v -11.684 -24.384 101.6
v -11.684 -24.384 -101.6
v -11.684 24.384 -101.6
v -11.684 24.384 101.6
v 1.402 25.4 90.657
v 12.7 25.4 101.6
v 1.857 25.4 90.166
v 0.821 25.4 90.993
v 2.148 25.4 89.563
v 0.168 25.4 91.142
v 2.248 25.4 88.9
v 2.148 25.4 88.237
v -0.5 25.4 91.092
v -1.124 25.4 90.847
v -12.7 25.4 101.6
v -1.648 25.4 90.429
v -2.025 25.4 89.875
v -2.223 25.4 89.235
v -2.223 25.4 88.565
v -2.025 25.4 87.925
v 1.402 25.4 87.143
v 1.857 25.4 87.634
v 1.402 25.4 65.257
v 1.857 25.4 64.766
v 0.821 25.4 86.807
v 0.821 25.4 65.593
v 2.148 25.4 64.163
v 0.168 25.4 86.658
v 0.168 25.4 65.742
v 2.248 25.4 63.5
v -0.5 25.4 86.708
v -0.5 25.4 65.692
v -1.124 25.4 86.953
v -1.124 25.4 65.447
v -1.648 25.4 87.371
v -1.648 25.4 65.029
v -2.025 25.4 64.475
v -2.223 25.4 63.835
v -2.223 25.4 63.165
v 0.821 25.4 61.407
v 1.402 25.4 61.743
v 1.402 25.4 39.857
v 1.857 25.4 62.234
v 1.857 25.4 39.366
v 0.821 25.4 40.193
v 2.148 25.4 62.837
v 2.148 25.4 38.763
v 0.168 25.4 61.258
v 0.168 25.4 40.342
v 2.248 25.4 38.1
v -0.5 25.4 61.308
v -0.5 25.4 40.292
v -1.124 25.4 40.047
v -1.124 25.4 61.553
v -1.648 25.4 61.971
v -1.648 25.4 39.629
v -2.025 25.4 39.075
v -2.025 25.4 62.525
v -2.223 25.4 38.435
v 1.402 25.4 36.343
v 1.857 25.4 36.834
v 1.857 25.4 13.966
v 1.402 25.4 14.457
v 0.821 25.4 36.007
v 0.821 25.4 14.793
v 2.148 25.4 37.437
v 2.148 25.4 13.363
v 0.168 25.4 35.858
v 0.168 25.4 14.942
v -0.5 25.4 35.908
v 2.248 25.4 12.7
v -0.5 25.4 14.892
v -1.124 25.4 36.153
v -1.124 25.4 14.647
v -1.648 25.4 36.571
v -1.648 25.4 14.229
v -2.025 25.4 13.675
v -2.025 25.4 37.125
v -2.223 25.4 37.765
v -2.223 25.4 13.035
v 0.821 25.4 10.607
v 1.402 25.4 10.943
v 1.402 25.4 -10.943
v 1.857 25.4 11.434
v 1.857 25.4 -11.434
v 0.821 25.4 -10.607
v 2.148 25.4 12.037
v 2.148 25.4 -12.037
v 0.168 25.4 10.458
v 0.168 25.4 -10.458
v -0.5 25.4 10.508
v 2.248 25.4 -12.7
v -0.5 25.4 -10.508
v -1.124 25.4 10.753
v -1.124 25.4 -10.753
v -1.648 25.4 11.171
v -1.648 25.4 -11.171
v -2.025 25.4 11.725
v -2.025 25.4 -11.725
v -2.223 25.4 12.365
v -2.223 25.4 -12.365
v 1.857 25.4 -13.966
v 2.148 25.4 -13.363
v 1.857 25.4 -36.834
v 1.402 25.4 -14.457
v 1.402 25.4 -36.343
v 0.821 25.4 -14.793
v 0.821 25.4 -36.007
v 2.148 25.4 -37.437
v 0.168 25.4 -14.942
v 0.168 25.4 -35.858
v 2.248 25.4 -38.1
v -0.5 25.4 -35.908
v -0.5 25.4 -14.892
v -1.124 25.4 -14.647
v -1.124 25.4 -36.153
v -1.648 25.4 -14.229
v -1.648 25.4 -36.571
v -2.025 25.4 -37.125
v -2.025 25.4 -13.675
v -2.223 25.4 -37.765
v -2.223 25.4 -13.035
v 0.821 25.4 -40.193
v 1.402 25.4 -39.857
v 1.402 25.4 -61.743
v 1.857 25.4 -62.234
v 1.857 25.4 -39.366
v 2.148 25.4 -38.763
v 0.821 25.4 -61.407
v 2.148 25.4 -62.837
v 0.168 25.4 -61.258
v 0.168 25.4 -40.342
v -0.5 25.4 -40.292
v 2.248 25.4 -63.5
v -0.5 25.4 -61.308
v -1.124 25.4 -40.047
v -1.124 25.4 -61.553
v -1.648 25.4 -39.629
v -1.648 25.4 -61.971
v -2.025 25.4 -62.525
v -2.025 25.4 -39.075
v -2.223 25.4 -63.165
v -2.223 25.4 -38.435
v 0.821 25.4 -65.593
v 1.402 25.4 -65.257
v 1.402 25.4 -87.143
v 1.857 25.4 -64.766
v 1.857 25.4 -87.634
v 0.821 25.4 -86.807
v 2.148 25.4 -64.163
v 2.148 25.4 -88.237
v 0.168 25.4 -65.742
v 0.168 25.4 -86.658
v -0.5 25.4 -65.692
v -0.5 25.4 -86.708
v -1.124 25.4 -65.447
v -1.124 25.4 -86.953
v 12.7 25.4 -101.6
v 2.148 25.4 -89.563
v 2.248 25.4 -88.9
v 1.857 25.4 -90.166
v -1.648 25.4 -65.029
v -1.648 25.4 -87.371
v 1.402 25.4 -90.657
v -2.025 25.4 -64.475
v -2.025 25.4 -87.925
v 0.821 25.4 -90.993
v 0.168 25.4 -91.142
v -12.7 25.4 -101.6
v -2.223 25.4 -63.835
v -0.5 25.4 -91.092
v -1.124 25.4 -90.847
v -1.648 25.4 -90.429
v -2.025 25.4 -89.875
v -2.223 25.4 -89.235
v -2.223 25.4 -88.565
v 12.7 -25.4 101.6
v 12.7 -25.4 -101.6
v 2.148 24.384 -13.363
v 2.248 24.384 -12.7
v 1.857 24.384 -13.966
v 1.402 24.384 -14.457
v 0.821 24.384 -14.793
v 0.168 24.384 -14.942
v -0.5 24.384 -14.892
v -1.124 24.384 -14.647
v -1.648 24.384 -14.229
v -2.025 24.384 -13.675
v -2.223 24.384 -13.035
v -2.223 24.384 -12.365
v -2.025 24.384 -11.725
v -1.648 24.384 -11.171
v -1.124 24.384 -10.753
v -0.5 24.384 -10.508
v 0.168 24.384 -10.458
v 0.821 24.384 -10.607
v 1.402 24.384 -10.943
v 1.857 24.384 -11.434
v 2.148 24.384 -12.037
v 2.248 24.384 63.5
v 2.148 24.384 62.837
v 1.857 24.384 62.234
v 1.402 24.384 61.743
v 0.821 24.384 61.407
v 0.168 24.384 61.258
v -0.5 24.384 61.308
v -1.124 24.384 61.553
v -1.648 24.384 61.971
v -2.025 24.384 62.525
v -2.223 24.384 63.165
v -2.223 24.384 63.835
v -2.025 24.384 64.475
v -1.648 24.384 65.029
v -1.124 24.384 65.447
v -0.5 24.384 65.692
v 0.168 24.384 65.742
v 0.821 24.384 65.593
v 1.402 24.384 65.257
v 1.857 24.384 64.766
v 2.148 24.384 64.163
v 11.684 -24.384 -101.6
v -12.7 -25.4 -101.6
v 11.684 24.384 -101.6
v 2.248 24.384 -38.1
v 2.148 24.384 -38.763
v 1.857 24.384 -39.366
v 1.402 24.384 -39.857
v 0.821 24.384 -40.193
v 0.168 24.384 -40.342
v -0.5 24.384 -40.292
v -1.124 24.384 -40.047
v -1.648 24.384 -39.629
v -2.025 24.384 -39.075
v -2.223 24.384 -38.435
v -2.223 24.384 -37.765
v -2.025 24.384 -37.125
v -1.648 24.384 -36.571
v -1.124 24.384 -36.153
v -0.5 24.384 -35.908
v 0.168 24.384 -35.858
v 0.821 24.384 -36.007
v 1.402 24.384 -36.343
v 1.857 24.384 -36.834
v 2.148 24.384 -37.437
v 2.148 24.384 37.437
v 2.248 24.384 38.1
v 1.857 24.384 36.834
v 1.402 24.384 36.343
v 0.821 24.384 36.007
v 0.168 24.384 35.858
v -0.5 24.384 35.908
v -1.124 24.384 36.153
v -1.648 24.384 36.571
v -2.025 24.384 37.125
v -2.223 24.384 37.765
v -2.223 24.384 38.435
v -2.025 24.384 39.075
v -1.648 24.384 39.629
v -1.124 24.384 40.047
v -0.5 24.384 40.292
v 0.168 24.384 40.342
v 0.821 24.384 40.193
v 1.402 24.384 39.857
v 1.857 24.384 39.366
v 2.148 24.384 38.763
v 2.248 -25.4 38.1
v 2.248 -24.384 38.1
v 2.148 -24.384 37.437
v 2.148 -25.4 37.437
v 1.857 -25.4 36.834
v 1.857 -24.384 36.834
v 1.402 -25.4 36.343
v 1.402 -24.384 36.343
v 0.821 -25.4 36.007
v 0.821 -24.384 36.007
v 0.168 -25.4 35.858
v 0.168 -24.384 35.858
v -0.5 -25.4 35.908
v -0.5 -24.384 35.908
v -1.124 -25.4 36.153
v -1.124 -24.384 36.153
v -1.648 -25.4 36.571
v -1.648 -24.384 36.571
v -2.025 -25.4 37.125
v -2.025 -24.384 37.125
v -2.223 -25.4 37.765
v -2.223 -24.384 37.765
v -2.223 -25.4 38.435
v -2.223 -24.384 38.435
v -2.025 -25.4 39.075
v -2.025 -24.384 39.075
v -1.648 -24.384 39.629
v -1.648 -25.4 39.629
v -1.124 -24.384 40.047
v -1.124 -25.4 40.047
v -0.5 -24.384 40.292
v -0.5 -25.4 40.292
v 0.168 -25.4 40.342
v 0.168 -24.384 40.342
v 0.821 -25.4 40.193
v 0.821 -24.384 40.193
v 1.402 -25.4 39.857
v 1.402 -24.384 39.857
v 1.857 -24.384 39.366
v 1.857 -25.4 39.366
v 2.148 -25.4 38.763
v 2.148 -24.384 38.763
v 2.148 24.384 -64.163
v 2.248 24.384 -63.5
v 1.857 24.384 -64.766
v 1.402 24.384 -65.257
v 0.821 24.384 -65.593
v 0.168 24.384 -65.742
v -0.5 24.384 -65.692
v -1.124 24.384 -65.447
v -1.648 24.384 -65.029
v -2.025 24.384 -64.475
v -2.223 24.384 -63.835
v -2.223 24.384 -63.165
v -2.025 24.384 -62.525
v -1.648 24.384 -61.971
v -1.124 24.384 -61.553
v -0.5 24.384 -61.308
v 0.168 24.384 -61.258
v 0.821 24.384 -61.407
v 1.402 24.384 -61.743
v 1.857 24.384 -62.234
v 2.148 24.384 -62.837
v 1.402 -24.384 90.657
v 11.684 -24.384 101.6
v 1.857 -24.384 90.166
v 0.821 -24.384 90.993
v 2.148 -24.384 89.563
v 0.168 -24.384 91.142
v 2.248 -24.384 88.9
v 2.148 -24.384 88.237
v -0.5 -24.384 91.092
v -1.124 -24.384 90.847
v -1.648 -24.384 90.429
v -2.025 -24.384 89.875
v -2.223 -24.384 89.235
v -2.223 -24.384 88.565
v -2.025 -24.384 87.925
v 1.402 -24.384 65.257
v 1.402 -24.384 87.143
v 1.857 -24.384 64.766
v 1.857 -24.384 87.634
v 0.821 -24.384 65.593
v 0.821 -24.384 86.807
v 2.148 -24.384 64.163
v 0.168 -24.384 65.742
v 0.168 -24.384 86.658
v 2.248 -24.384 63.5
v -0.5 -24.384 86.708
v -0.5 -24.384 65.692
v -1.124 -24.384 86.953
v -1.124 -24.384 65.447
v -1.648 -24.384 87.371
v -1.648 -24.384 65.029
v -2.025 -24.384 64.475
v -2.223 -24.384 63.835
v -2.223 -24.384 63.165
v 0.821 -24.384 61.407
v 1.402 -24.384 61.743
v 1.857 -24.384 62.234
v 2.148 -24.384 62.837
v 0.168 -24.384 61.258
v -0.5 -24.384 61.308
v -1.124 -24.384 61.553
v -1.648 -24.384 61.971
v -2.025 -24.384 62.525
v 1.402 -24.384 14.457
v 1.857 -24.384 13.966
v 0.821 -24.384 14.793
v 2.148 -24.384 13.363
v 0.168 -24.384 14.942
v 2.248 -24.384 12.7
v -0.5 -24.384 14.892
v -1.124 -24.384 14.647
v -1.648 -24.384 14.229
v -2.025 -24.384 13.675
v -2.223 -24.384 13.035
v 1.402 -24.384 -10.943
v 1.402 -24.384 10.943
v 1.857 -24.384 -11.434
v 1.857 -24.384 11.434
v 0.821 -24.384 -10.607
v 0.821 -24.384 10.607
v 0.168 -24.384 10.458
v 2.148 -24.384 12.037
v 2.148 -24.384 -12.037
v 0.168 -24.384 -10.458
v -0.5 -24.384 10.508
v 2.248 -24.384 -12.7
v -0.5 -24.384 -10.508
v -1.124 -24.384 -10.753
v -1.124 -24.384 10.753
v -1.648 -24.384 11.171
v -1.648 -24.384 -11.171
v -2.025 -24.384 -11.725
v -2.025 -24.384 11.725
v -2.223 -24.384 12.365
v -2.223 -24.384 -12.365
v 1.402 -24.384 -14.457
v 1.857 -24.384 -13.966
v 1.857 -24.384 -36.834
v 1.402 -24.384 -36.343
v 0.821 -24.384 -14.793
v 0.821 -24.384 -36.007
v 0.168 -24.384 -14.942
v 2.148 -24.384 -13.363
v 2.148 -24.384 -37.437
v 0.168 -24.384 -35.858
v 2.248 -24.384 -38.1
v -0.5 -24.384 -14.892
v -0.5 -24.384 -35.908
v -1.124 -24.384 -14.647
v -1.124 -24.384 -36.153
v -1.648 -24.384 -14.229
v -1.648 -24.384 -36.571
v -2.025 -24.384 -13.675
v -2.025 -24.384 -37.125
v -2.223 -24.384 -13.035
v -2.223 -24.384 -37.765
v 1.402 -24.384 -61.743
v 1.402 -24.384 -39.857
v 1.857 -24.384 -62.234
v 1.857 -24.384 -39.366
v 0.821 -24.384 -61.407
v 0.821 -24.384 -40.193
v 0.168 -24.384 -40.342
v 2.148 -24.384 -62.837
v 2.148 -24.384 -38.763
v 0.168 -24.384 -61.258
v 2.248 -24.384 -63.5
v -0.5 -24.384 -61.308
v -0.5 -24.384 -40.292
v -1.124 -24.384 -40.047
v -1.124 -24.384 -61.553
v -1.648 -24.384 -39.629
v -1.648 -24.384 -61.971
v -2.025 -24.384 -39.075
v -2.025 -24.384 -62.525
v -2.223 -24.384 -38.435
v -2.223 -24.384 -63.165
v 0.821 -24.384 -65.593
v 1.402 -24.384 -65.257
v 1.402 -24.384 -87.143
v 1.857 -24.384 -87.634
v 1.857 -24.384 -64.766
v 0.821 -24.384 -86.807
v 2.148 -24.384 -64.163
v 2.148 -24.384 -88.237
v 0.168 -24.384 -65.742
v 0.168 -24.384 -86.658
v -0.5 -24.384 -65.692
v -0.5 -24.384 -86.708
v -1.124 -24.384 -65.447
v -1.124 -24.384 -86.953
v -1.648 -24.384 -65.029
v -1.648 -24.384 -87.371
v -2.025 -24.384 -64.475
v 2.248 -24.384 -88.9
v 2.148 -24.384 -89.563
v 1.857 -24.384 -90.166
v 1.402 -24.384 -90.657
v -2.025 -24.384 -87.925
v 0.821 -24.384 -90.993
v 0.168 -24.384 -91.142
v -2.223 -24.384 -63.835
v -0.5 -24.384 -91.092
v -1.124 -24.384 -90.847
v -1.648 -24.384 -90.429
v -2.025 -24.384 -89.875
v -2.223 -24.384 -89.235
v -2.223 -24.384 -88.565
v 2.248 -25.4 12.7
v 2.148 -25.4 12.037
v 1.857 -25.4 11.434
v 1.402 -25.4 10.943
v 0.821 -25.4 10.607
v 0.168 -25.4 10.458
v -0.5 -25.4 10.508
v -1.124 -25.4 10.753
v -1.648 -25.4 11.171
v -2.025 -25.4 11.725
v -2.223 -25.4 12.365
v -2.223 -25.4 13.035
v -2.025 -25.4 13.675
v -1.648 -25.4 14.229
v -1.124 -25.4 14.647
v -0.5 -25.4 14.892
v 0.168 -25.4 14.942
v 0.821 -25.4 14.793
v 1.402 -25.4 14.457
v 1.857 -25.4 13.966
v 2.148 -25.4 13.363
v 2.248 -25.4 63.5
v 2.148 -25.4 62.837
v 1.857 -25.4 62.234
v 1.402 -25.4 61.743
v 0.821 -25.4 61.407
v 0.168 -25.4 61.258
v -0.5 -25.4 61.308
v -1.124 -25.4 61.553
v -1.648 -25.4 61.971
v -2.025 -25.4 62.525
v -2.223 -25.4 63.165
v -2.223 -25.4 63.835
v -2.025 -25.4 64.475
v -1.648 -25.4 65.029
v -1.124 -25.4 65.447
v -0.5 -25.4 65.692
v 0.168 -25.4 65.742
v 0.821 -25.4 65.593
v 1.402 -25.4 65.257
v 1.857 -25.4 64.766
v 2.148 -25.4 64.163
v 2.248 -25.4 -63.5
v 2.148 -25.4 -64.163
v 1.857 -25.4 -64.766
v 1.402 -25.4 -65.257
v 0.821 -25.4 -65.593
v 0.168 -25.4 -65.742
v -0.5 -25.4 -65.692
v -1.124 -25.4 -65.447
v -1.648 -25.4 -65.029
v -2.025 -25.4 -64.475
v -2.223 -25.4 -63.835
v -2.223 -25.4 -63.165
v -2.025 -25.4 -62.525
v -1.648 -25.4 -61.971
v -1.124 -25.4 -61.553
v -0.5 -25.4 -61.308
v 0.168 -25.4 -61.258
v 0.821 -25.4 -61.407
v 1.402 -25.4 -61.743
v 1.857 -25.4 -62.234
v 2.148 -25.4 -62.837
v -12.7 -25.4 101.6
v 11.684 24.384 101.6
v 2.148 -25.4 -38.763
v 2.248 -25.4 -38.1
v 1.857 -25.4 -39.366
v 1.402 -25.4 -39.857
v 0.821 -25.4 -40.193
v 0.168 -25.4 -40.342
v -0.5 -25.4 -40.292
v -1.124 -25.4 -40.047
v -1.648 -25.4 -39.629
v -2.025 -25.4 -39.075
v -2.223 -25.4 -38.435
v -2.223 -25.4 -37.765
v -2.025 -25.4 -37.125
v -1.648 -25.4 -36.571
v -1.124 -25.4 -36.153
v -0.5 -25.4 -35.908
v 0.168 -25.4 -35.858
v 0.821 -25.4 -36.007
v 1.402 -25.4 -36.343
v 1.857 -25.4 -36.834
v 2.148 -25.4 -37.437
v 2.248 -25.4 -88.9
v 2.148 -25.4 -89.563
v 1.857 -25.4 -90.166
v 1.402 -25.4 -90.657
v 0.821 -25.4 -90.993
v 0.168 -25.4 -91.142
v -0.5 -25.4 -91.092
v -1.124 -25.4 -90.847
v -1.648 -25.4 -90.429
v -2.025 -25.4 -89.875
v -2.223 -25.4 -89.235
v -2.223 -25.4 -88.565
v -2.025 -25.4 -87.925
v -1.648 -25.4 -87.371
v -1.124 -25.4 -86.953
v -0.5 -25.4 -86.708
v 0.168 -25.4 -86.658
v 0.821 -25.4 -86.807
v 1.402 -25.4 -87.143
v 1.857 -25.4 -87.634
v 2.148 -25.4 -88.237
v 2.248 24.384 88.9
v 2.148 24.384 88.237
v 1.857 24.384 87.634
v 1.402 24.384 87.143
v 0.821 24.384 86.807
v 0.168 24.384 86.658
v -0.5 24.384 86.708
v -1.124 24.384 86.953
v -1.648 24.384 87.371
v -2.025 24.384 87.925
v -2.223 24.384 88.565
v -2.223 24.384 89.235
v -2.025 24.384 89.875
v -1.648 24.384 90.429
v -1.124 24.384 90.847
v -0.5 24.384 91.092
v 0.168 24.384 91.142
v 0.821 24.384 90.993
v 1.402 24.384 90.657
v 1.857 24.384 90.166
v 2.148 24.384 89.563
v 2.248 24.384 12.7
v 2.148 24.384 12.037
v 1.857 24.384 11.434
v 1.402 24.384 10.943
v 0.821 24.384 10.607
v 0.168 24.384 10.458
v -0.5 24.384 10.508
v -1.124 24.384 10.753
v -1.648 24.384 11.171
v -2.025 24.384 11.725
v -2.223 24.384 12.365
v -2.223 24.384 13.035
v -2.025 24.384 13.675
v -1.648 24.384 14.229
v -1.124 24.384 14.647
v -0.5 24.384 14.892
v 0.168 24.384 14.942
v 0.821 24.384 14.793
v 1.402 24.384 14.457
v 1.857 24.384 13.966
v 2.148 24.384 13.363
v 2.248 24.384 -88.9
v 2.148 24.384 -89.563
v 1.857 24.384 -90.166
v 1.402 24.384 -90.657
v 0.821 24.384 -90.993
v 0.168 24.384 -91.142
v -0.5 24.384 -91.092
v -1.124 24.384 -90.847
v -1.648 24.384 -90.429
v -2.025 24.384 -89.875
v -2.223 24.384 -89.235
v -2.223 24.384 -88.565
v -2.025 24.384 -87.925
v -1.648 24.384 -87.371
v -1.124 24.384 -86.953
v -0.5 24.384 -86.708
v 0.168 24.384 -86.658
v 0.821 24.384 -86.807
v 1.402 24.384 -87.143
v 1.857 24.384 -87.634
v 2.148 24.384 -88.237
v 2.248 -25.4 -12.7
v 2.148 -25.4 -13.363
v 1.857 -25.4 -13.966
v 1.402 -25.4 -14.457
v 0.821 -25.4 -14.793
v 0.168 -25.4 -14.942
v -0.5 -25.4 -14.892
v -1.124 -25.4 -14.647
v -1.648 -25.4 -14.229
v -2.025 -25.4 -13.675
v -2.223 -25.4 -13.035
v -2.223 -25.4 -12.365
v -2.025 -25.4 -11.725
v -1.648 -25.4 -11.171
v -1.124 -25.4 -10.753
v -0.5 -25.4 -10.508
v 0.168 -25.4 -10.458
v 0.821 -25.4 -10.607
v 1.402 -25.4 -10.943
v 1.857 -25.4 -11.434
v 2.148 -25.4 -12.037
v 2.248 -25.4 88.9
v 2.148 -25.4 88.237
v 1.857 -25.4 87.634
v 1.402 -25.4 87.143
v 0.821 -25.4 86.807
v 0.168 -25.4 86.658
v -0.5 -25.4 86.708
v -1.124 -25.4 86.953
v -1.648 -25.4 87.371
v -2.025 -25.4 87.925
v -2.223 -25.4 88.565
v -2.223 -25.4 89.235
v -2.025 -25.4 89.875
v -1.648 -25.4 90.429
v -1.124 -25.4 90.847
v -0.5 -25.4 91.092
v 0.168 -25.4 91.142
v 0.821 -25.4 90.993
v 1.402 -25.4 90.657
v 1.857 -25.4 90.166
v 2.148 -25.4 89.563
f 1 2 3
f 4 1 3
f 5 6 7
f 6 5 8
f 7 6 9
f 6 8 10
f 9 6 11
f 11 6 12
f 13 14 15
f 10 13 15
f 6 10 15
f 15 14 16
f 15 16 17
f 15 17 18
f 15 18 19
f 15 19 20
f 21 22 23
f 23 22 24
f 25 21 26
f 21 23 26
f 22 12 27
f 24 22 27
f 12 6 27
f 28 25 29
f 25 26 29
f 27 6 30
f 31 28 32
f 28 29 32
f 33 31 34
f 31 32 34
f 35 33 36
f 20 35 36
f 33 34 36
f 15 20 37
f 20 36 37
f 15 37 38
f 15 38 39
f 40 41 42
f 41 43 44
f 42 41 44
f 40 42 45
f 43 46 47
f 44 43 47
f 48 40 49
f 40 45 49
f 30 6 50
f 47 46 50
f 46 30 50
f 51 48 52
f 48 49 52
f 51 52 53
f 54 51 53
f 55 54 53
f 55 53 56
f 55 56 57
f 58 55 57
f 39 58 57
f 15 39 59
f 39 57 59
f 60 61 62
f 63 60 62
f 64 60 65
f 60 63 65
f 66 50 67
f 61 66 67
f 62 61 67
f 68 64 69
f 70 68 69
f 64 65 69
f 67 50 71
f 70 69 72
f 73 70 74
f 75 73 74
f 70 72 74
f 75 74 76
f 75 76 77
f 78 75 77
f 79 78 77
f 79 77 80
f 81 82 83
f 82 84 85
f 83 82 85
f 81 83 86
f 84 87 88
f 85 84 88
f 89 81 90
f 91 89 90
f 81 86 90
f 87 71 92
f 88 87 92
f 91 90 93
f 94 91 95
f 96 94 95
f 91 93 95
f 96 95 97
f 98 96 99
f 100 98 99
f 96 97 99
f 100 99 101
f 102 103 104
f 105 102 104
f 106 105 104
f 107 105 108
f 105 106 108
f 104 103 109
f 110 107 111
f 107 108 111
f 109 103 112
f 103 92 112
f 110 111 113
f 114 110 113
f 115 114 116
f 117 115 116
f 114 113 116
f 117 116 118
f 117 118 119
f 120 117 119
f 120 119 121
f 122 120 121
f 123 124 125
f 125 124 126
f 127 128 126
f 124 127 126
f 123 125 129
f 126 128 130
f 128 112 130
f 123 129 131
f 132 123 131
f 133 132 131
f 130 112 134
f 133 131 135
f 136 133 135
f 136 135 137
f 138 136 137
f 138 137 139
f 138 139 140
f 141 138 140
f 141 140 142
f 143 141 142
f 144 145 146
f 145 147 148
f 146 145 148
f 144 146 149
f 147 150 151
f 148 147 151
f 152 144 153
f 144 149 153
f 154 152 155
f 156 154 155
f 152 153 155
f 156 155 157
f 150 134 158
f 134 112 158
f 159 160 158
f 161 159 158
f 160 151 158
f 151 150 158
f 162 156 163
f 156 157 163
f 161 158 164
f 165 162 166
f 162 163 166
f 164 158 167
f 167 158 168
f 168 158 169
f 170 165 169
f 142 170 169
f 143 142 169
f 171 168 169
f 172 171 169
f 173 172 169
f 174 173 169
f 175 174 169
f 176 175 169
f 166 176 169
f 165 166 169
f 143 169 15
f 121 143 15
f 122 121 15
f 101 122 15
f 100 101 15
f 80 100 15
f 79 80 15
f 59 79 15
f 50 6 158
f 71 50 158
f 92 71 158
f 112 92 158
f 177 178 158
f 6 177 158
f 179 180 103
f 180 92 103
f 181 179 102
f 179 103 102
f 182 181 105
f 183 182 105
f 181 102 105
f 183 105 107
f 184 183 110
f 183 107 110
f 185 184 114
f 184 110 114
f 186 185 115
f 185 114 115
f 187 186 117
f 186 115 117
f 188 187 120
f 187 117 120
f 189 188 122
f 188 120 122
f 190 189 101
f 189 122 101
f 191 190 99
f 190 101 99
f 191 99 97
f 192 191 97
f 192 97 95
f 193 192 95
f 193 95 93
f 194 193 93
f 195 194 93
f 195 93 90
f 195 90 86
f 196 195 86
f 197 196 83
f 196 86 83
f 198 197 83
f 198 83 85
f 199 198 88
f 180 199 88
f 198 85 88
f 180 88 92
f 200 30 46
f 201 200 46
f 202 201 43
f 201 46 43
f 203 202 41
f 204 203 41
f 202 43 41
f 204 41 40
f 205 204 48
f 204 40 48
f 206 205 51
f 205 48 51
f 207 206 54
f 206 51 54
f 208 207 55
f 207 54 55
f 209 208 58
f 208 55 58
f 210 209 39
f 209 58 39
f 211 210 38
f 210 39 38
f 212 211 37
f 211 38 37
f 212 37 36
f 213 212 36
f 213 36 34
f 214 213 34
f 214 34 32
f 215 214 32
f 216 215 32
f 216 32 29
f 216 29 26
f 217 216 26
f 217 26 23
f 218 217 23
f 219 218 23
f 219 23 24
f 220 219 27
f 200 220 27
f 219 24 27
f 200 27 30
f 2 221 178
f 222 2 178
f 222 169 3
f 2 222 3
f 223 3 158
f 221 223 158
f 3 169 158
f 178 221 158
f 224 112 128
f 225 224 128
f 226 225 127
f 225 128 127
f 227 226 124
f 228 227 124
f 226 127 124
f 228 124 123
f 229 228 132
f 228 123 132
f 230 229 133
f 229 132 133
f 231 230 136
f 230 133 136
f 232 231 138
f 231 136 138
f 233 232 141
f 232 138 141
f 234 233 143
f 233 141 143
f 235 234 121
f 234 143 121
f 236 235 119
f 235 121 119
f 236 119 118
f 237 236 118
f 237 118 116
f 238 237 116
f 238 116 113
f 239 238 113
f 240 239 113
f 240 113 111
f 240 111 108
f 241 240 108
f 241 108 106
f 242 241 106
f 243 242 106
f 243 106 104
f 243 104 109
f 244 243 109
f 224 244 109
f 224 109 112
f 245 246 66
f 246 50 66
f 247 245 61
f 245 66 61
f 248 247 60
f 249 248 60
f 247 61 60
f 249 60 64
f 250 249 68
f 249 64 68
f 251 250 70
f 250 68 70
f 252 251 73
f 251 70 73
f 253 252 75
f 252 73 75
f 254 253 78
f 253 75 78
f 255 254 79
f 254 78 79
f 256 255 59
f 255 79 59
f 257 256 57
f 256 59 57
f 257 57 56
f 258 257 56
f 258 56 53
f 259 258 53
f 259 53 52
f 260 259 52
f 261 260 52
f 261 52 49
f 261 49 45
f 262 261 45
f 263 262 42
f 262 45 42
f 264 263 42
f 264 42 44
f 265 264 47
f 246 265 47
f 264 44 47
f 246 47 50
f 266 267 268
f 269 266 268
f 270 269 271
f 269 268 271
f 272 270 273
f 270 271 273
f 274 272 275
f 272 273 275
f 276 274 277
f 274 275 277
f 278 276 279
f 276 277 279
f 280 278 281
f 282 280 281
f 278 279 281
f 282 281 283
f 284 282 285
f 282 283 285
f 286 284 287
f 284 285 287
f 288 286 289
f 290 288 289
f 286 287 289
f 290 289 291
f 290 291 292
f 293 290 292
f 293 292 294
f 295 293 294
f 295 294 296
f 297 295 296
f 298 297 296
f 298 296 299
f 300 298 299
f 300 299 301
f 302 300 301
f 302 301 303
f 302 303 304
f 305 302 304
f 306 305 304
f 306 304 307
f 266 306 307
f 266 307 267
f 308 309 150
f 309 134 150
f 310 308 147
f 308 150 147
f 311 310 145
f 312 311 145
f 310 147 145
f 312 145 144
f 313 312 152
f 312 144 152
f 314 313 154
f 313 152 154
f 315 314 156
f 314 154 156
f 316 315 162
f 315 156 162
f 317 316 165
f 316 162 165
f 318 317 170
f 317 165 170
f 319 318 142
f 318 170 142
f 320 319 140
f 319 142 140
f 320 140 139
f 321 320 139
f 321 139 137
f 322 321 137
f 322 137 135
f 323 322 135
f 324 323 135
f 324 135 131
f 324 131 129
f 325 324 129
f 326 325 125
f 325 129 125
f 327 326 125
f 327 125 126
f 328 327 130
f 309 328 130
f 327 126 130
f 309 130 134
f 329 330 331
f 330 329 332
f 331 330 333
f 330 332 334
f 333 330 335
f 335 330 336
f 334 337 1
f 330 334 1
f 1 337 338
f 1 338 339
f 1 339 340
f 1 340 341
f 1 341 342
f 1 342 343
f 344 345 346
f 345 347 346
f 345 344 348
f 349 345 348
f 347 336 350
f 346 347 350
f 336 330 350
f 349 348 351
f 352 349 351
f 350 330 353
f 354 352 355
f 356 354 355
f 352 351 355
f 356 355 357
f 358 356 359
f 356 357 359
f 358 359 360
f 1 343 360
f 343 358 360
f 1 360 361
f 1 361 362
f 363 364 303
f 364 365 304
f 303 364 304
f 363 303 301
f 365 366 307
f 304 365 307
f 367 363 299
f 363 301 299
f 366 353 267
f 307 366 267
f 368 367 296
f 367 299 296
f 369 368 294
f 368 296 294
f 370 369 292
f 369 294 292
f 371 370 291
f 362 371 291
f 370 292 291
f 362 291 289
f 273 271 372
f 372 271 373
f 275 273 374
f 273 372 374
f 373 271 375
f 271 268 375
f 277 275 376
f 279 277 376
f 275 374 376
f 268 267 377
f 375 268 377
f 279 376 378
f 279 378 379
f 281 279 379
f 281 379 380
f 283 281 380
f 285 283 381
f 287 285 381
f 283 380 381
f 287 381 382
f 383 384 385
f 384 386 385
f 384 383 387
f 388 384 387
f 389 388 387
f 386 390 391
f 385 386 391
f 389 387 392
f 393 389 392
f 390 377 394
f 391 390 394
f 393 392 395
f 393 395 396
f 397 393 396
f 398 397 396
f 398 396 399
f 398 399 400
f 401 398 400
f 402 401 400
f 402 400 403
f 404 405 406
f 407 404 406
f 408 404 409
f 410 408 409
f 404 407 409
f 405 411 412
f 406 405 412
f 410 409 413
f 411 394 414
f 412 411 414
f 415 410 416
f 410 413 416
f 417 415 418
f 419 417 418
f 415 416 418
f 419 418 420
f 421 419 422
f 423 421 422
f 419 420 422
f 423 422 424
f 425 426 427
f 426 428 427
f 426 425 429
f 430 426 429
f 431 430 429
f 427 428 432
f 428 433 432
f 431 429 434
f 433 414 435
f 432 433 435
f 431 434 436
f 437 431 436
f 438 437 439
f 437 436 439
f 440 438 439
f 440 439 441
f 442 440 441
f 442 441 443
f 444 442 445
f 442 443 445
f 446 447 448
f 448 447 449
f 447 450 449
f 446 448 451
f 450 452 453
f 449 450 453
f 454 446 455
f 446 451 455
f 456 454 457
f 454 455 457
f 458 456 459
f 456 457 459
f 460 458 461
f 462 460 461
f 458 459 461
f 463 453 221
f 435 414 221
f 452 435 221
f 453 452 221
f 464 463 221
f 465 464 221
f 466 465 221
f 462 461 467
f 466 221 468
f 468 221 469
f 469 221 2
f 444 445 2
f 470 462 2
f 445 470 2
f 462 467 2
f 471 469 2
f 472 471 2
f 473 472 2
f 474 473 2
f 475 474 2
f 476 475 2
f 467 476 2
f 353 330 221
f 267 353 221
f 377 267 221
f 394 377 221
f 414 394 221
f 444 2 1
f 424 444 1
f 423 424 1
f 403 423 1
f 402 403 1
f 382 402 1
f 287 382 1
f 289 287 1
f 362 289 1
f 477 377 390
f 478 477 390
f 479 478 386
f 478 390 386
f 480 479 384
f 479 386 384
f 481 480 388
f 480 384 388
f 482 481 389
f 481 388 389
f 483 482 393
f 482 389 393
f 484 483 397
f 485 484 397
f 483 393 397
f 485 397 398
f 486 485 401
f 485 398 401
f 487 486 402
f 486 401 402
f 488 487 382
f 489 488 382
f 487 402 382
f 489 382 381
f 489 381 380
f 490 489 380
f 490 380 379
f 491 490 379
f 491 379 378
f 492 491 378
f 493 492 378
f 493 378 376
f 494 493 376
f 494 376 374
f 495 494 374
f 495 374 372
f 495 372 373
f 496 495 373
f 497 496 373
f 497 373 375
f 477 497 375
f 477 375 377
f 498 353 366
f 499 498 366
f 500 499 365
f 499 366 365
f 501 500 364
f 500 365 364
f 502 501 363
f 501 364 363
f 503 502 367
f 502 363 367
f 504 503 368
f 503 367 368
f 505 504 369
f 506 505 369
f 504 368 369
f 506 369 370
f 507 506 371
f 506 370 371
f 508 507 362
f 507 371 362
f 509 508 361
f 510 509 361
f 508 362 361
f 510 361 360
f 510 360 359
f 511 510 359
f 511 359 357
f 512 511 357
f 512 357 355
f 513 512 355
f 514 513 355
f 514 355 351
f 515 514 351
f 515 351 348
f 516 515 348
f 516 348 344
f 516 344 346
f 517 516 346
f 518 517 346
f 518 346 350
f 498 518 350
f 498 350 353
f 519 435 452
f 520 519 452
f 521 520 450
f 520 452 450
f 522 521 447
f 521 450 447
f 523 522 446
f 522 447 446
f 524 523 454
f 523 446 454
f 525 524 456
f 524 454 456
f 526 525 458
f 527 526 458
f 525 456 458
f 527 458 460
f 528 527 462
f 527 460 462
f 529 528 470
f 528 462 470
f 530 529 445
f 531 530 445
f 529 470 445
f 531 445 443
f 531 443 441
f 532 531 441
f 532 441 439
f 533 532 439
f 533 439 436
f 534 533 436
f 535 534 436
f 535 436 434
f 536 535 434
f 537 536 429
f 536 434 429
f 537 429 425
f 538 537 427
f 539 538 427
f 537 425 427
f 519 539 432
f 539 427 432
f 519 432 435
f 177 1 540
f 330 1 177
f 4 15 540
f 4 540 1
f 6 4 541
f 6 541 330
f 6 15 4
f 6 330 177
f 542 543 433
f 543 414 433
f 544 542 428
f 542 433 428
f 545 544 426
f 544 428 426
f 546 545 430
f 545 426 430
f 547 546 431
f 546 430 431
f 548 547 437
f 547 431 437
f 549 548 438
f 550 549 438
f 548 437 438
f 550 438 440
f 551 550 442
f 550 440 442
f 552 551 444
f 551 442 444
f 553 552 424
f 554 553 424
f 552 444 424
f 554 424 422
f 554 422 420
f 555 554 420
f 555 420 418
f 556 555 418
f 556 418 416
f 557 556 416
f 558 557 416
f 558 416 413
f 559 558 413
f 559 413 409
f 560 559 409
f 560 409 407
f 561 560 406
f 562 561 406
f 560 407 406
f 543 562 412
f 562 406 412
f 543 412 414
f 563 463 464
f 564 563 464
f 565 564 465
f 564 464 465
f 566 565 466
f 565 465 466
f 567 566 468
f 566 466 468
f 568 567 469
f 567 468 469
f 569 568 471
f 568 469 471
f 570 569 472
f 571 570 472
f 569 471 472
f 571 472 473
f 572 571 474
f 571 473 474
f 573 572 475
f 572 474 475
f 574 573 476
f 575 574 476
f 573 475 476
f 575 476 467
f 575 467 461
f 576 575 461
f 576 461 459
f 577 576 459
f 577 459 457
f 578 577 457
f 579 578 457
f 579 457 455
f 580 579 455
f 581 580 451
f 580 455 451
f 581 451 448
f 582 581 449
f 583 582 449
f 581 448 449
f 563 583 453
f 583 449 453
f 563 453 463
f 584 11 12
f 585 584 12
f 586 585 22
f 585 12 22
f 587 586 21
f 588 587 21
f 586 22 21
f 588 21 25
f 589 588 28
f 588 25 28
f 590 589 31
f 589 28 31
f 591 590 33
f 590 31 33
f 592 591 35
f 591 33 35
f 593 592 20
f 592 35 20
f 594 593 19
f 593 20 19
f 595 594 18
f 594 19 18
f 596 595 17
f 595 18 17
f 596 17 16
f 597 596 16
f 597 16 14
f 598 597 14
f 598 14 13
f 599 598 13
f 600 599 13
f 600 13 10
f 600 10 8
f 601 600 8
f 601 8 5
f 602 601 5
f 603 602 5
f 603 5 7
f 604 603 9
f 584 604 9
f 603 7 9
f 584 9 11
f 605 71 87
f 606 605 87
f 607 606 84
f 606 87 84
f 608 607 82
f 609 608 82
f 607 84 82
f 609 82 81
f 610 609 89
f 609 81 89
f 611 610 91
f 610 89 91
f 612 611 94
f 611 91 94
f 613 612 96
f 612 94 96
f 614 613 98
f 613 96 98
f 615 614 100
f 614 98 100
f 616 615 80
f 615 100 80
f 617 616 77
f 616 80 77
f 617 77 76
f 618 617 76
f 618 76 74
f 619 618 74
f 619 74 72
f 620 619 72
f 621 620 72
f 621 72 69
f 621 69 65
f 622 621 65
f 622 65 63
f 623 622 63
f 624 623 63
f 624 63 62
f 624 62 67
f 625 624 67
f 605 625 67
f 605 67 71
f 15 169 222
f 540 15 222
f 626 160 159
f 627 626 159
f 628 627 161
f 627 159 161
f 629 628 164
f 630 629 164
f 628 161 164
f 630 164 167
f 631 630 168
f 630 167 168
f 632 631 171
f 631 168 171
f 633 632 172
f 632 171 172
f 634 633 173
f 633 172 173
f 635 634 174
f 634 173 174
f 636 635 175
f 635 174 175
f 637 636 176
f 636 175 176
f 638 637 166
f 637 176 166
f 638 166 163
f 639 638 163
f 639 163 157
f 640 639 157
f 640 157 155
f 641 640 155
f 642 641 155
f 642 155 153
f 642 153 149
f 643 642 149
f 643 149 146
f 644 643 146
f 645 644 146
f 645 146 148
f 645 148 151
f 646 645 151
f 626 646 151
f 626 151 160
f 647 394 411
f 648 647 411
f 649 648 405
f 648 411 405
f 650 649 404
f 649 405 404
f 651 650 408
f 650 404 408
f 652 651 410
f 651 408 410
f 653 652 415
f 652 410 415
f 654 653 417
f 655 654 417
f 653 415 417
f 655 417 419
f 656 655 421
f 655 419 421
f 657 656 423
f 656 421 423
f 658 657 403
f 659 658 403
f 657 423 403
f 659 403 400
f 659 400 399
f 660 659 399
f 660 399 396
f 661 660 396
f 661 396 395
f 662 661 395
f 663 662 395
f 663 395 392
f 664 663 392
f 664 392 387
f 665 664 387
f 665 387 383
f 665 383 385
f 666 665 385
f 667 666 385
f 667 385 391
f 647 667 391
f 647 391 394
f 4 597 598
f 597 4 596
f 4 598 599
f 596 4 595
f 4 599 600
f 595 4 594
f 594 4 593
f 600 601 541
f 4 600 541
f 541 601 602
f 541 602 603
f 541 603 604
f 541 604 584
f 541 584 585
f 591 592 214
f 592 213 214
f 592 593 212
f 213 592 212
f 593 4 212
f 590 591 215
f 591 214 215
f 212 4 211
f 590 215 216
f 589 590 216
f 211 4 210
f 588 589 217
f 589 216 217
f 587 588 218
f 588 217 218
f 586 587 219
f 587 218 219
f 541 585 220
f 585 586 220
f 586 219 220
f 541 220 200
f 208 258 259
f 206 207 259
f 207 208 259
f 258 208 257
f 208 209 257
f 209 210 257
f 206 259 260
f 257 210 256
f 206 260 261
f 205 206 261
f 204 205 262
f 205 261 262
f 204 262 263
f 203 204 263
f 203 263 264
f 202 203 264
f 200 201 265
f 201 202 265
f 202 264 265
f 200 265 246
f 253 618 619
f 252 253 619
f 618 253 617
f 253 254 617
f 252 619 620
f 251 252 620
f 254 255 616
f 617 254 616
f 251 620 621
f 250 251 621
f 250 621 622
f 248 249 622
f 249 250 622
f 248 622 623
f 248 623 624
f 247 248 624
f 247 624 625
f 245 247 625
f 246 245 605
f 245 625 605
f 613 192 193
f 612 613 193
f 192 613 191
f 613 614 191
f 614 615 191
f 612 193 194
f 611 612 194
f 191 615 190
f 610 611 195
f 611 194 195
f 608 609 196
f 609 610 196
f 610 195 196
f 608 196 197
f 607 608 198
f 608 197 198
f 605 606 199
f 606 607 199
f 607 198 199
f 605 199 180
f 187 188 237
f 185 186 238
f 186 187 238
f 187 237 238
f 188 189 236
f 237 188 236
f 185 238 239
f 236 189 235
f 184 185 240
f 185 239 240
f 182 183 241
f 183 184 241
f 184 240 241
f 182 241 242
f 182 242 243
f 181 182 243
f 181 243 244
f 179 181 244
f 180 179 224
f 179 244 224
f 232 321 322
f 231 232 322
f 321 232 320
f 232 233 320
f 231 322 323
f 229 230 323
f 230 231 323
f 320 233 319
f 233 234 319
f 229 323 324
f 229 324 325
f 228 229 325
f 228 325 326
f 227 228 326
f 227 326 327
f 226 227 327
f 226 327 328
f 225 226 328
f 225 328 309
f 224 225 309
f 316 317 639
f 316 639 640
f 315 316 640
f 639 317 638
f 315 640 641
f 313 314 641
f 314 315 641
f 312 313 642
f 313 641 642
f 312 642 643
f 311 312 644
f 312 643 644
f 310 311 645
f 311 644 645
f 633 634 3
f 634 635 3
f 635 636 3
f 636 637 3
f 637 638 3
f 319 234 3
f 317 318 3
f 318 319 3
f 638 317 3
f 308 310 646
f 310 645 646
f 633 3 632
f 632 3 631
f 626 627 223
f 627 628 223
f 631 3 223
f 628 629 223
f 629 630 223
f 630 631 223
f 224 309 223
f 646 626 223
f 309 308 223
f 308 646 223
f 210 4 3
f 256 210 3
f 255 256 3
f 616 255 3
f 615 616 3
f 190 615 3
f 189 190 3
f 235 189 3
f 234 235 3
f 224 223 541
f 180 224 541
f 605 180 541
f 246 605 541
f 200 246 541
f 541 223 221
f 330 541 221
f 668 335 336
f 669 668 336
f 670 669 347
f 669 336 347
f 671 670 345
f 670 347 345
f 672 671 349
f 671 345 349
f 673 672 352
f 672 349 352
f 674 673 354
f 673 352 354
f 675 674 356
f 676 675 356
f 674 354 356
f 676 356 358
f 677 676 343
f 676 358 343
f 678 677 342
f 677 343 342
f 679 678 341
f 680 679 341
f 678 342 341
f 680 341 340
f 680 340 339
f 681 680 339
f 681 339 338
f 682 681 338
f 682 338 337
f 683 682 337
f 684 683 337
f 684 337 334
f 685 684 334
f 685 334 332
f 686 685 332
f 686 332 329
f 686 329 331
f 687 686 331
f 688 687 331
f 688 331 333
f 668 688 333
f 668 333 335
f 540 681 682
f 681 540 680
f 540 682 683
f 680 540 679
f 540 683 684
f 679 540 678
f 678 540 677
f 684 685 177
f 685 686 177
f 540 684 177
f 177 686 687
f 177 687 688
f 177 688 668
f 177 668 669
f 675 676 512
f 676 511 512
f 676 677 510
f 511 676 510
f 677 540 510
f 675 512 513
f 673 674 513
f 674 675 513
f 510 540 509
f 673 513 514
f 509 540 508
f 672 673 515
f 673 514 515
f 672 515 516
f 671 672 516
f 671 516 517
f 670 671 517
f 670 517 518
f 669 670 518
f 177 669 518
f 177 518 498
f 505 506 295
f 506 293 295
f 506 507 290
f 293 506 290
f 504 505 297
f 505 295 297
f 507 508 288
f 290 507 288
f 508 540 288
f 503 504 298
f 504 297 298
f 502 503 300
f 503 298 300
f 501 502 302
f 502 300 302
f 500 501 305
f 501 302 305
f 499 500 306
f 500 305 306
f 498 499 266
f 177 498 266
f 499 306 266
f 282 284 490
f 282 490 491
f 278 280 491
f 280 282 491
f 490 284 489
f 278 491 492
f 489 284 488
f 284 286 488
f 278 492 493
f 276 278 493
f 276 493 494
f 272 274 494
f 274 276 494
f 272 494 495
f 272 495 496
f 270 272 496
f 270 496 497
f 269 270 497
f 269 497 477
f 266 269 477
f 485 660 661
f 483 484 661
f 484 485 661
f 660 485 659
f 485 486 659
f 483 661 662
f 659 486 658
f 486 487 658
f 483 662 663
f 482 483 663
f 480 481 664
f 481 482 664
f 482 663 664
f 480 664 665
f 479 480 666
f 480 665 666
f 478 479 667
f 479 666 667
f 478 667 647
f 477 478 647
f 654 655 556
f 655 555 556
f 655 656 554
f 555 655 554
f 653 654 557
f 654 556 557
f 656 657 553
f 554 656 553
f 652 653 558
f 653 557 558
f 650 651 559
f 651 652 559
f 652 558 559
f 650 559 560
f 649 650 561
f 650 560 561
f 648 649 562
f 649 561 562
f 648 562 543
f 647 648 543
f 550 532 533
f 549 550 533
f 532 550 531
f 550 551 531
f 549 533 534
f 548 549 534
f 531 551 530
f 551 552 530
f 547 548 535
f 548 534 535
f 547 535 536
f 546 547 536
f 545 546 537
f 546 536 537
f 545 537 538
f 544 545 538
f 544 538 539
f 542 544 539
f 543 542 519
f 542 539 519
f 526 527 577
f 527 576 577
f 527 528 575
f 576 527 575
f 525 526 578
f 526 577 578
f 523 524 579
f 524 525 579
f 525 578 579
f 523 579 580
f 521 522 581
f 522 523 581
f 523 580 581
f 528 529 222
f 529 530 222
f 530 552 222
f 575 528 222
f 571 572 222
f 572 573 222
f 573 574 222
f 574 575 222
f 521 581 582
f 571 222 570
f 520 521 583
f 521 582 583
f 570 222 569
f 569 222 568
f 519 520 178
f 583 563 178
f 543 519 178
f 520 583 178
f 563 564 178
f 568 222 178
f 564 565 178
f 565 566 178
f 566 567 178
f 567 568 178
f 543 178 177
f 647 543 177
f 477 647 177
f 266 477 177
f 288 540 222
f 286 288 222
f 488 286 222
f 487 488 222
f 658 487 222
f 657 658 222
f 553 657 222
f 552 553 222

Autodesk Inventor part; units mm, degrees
ref_plane "YZ Plane" through (0, 0, 0) normal (1, 0, 0) x (0, 1, 0)
ref_plane "XZ Plane" through (0, 0, 0) normal (0, 1, 0) x (-1, 0, 0)
ref_plane "XY Plane" through (0, 0, 0) normal (0, 0, 1) x (1, 0, 0)
sketch "Sketch1" plane through (0, 0, 0) normal (0, 0, 1) x (1, 0, 0)
  line L0 (12.7, 25.4) -> (-12.7, 25.4)
  line L1 (-12.7, 25.4) -> (-12.7, -25.4)
  line L2 (-12.7, -25.4) -> (12.7, -25.4)
  line L3 (12.7, -25.4) -> (12.7, 25.4)
  line L4 (12.7, 25.4) -> (-12.7, -25.4) construction
  line L5 (-12.7, 25.4) -> (12.7, -25.4) construction
  line L6 (-11.684, 24.384) -> (11.684, 24.384)
  line L7 (11.684, 24.384) -> (11.684, -24.384)
  line L8 (11.684, -24.384) -> (-11.684, -24.384)
  line L9 (-11.684, -24.384) -> (-11.684, 24.384)
  point P0 (0, 0)
  dimension "d0" = 1.016
  dimension "d1" = 50.8
  dimension "d2" = 25.4
extrude "Tube Length" add sketch "Sketch1" along normal mid plane 203.2
sketch "Sketch2" plane through (-12.7, 25.4, 101.6) normal (0, 1, 0) x (1, 0, 0)
  line L0 (0, 0) -> (0, 203.2) projected
  line L1 (25.4, 0) -> (0, 0) projected
  line L2 (25.4, 203.2) -> (25.4, 0) projected
  line L3 (0, 203.2) -> (25.4, 203.2) projected
  line L4 (25.4, 0) -> (0, 0) projected
  line L5 (12.7, 0) -> (12.7, 12.7) construction
  circle A0 centre (12.7, 12.7) radius 2.2479
  point P0 (12.7, 101.6)
  dimension "d5" = 12.7
  dimension "d6" = 4.4958
extrude "Top Hole" cut sketch "Sketch2" against normal through all contours A0
pattern_linear "Rectangular Pattern1" count 8 spacing 25.4 along (0, 0, -1) of "Top Hole"
sketch "Sketch3" plane through (0, 0, 101.6) normal (0, 0, 1) x (1, 0, 0)
  line L0 (0, 0) -> (0, 25.4) construction
  line L1 (12.7, 25.4) -> (-12.7, 25.4) projected
  line L2 (-0.0508, 25.4) -> (0, 25.2984)
  line L3 (0.0508, 25.4) -> (0, 25.2984)
  line L4 (-12.7, 12.6492) -> (-12.5984, 12.7)
  line L5 (-12.7, 12.7508) -> (-12.5984, 12.7)
  line L6 (-12.7, -0.0508) -> (-12.5984, 0)
  line L7 (-12.7, 0.0508) -> (-12.5984, 0)
  line L8 (-12.7, -12.7508) -> (-12.5984, -12.7)
  line L9 (-12.7, -12.6492) -> (-12.5984, -12.7)
  line L10 (12.7, 0.0508) -> (12.5984, 0)
  line L11 (12.7, 12.6492) -> (12.5984, 12.7)
  line L12 (12.7, 12.7508) -> (12.5984, 12.7)
  line L13 (12.7, -0.0508) -> (12.5984, 0)
  line L14 (12.7, -12.6492) -> (12.5984, -12.7)
  line L15 (12.7, -12.7508) -> (12.5984, -12.7)
  line L16 (0.0508, -25.4) -> (0, -25.2984)
  line L17 (-0.0508, -25.4) -> (0, -25.2984)
  line L18 (-12.7, 25.4) -> (-12.7, -25.4) projected
  line L19 (12.7, -25.4) -> (12.7, 25.4) projected
  line L20 (-12.7, -25.4) -> (12.7, -25.4) projected
  point P0 (0, 12.7)
  point P1 (-12.7, 12.7)
  point P2 (-12.7, 0)
  point P3 (-12.7, -12.7)
  point P4 (12.7, 12.7)
  point P5 (12.7, 0)
  point P6 (12.7, -12.7)
  point P7 (0, -25.4)
  dimension "d12" = 0.1016
  dimension "d13" = 0.1016
  dimension "d16" = 90
  dimension "d20" = 12.7
  dimension "d27" = 360
equation "\"d13\" = d12"
properties part number "Carrage Side Tube" material "Aluminum 6061"
